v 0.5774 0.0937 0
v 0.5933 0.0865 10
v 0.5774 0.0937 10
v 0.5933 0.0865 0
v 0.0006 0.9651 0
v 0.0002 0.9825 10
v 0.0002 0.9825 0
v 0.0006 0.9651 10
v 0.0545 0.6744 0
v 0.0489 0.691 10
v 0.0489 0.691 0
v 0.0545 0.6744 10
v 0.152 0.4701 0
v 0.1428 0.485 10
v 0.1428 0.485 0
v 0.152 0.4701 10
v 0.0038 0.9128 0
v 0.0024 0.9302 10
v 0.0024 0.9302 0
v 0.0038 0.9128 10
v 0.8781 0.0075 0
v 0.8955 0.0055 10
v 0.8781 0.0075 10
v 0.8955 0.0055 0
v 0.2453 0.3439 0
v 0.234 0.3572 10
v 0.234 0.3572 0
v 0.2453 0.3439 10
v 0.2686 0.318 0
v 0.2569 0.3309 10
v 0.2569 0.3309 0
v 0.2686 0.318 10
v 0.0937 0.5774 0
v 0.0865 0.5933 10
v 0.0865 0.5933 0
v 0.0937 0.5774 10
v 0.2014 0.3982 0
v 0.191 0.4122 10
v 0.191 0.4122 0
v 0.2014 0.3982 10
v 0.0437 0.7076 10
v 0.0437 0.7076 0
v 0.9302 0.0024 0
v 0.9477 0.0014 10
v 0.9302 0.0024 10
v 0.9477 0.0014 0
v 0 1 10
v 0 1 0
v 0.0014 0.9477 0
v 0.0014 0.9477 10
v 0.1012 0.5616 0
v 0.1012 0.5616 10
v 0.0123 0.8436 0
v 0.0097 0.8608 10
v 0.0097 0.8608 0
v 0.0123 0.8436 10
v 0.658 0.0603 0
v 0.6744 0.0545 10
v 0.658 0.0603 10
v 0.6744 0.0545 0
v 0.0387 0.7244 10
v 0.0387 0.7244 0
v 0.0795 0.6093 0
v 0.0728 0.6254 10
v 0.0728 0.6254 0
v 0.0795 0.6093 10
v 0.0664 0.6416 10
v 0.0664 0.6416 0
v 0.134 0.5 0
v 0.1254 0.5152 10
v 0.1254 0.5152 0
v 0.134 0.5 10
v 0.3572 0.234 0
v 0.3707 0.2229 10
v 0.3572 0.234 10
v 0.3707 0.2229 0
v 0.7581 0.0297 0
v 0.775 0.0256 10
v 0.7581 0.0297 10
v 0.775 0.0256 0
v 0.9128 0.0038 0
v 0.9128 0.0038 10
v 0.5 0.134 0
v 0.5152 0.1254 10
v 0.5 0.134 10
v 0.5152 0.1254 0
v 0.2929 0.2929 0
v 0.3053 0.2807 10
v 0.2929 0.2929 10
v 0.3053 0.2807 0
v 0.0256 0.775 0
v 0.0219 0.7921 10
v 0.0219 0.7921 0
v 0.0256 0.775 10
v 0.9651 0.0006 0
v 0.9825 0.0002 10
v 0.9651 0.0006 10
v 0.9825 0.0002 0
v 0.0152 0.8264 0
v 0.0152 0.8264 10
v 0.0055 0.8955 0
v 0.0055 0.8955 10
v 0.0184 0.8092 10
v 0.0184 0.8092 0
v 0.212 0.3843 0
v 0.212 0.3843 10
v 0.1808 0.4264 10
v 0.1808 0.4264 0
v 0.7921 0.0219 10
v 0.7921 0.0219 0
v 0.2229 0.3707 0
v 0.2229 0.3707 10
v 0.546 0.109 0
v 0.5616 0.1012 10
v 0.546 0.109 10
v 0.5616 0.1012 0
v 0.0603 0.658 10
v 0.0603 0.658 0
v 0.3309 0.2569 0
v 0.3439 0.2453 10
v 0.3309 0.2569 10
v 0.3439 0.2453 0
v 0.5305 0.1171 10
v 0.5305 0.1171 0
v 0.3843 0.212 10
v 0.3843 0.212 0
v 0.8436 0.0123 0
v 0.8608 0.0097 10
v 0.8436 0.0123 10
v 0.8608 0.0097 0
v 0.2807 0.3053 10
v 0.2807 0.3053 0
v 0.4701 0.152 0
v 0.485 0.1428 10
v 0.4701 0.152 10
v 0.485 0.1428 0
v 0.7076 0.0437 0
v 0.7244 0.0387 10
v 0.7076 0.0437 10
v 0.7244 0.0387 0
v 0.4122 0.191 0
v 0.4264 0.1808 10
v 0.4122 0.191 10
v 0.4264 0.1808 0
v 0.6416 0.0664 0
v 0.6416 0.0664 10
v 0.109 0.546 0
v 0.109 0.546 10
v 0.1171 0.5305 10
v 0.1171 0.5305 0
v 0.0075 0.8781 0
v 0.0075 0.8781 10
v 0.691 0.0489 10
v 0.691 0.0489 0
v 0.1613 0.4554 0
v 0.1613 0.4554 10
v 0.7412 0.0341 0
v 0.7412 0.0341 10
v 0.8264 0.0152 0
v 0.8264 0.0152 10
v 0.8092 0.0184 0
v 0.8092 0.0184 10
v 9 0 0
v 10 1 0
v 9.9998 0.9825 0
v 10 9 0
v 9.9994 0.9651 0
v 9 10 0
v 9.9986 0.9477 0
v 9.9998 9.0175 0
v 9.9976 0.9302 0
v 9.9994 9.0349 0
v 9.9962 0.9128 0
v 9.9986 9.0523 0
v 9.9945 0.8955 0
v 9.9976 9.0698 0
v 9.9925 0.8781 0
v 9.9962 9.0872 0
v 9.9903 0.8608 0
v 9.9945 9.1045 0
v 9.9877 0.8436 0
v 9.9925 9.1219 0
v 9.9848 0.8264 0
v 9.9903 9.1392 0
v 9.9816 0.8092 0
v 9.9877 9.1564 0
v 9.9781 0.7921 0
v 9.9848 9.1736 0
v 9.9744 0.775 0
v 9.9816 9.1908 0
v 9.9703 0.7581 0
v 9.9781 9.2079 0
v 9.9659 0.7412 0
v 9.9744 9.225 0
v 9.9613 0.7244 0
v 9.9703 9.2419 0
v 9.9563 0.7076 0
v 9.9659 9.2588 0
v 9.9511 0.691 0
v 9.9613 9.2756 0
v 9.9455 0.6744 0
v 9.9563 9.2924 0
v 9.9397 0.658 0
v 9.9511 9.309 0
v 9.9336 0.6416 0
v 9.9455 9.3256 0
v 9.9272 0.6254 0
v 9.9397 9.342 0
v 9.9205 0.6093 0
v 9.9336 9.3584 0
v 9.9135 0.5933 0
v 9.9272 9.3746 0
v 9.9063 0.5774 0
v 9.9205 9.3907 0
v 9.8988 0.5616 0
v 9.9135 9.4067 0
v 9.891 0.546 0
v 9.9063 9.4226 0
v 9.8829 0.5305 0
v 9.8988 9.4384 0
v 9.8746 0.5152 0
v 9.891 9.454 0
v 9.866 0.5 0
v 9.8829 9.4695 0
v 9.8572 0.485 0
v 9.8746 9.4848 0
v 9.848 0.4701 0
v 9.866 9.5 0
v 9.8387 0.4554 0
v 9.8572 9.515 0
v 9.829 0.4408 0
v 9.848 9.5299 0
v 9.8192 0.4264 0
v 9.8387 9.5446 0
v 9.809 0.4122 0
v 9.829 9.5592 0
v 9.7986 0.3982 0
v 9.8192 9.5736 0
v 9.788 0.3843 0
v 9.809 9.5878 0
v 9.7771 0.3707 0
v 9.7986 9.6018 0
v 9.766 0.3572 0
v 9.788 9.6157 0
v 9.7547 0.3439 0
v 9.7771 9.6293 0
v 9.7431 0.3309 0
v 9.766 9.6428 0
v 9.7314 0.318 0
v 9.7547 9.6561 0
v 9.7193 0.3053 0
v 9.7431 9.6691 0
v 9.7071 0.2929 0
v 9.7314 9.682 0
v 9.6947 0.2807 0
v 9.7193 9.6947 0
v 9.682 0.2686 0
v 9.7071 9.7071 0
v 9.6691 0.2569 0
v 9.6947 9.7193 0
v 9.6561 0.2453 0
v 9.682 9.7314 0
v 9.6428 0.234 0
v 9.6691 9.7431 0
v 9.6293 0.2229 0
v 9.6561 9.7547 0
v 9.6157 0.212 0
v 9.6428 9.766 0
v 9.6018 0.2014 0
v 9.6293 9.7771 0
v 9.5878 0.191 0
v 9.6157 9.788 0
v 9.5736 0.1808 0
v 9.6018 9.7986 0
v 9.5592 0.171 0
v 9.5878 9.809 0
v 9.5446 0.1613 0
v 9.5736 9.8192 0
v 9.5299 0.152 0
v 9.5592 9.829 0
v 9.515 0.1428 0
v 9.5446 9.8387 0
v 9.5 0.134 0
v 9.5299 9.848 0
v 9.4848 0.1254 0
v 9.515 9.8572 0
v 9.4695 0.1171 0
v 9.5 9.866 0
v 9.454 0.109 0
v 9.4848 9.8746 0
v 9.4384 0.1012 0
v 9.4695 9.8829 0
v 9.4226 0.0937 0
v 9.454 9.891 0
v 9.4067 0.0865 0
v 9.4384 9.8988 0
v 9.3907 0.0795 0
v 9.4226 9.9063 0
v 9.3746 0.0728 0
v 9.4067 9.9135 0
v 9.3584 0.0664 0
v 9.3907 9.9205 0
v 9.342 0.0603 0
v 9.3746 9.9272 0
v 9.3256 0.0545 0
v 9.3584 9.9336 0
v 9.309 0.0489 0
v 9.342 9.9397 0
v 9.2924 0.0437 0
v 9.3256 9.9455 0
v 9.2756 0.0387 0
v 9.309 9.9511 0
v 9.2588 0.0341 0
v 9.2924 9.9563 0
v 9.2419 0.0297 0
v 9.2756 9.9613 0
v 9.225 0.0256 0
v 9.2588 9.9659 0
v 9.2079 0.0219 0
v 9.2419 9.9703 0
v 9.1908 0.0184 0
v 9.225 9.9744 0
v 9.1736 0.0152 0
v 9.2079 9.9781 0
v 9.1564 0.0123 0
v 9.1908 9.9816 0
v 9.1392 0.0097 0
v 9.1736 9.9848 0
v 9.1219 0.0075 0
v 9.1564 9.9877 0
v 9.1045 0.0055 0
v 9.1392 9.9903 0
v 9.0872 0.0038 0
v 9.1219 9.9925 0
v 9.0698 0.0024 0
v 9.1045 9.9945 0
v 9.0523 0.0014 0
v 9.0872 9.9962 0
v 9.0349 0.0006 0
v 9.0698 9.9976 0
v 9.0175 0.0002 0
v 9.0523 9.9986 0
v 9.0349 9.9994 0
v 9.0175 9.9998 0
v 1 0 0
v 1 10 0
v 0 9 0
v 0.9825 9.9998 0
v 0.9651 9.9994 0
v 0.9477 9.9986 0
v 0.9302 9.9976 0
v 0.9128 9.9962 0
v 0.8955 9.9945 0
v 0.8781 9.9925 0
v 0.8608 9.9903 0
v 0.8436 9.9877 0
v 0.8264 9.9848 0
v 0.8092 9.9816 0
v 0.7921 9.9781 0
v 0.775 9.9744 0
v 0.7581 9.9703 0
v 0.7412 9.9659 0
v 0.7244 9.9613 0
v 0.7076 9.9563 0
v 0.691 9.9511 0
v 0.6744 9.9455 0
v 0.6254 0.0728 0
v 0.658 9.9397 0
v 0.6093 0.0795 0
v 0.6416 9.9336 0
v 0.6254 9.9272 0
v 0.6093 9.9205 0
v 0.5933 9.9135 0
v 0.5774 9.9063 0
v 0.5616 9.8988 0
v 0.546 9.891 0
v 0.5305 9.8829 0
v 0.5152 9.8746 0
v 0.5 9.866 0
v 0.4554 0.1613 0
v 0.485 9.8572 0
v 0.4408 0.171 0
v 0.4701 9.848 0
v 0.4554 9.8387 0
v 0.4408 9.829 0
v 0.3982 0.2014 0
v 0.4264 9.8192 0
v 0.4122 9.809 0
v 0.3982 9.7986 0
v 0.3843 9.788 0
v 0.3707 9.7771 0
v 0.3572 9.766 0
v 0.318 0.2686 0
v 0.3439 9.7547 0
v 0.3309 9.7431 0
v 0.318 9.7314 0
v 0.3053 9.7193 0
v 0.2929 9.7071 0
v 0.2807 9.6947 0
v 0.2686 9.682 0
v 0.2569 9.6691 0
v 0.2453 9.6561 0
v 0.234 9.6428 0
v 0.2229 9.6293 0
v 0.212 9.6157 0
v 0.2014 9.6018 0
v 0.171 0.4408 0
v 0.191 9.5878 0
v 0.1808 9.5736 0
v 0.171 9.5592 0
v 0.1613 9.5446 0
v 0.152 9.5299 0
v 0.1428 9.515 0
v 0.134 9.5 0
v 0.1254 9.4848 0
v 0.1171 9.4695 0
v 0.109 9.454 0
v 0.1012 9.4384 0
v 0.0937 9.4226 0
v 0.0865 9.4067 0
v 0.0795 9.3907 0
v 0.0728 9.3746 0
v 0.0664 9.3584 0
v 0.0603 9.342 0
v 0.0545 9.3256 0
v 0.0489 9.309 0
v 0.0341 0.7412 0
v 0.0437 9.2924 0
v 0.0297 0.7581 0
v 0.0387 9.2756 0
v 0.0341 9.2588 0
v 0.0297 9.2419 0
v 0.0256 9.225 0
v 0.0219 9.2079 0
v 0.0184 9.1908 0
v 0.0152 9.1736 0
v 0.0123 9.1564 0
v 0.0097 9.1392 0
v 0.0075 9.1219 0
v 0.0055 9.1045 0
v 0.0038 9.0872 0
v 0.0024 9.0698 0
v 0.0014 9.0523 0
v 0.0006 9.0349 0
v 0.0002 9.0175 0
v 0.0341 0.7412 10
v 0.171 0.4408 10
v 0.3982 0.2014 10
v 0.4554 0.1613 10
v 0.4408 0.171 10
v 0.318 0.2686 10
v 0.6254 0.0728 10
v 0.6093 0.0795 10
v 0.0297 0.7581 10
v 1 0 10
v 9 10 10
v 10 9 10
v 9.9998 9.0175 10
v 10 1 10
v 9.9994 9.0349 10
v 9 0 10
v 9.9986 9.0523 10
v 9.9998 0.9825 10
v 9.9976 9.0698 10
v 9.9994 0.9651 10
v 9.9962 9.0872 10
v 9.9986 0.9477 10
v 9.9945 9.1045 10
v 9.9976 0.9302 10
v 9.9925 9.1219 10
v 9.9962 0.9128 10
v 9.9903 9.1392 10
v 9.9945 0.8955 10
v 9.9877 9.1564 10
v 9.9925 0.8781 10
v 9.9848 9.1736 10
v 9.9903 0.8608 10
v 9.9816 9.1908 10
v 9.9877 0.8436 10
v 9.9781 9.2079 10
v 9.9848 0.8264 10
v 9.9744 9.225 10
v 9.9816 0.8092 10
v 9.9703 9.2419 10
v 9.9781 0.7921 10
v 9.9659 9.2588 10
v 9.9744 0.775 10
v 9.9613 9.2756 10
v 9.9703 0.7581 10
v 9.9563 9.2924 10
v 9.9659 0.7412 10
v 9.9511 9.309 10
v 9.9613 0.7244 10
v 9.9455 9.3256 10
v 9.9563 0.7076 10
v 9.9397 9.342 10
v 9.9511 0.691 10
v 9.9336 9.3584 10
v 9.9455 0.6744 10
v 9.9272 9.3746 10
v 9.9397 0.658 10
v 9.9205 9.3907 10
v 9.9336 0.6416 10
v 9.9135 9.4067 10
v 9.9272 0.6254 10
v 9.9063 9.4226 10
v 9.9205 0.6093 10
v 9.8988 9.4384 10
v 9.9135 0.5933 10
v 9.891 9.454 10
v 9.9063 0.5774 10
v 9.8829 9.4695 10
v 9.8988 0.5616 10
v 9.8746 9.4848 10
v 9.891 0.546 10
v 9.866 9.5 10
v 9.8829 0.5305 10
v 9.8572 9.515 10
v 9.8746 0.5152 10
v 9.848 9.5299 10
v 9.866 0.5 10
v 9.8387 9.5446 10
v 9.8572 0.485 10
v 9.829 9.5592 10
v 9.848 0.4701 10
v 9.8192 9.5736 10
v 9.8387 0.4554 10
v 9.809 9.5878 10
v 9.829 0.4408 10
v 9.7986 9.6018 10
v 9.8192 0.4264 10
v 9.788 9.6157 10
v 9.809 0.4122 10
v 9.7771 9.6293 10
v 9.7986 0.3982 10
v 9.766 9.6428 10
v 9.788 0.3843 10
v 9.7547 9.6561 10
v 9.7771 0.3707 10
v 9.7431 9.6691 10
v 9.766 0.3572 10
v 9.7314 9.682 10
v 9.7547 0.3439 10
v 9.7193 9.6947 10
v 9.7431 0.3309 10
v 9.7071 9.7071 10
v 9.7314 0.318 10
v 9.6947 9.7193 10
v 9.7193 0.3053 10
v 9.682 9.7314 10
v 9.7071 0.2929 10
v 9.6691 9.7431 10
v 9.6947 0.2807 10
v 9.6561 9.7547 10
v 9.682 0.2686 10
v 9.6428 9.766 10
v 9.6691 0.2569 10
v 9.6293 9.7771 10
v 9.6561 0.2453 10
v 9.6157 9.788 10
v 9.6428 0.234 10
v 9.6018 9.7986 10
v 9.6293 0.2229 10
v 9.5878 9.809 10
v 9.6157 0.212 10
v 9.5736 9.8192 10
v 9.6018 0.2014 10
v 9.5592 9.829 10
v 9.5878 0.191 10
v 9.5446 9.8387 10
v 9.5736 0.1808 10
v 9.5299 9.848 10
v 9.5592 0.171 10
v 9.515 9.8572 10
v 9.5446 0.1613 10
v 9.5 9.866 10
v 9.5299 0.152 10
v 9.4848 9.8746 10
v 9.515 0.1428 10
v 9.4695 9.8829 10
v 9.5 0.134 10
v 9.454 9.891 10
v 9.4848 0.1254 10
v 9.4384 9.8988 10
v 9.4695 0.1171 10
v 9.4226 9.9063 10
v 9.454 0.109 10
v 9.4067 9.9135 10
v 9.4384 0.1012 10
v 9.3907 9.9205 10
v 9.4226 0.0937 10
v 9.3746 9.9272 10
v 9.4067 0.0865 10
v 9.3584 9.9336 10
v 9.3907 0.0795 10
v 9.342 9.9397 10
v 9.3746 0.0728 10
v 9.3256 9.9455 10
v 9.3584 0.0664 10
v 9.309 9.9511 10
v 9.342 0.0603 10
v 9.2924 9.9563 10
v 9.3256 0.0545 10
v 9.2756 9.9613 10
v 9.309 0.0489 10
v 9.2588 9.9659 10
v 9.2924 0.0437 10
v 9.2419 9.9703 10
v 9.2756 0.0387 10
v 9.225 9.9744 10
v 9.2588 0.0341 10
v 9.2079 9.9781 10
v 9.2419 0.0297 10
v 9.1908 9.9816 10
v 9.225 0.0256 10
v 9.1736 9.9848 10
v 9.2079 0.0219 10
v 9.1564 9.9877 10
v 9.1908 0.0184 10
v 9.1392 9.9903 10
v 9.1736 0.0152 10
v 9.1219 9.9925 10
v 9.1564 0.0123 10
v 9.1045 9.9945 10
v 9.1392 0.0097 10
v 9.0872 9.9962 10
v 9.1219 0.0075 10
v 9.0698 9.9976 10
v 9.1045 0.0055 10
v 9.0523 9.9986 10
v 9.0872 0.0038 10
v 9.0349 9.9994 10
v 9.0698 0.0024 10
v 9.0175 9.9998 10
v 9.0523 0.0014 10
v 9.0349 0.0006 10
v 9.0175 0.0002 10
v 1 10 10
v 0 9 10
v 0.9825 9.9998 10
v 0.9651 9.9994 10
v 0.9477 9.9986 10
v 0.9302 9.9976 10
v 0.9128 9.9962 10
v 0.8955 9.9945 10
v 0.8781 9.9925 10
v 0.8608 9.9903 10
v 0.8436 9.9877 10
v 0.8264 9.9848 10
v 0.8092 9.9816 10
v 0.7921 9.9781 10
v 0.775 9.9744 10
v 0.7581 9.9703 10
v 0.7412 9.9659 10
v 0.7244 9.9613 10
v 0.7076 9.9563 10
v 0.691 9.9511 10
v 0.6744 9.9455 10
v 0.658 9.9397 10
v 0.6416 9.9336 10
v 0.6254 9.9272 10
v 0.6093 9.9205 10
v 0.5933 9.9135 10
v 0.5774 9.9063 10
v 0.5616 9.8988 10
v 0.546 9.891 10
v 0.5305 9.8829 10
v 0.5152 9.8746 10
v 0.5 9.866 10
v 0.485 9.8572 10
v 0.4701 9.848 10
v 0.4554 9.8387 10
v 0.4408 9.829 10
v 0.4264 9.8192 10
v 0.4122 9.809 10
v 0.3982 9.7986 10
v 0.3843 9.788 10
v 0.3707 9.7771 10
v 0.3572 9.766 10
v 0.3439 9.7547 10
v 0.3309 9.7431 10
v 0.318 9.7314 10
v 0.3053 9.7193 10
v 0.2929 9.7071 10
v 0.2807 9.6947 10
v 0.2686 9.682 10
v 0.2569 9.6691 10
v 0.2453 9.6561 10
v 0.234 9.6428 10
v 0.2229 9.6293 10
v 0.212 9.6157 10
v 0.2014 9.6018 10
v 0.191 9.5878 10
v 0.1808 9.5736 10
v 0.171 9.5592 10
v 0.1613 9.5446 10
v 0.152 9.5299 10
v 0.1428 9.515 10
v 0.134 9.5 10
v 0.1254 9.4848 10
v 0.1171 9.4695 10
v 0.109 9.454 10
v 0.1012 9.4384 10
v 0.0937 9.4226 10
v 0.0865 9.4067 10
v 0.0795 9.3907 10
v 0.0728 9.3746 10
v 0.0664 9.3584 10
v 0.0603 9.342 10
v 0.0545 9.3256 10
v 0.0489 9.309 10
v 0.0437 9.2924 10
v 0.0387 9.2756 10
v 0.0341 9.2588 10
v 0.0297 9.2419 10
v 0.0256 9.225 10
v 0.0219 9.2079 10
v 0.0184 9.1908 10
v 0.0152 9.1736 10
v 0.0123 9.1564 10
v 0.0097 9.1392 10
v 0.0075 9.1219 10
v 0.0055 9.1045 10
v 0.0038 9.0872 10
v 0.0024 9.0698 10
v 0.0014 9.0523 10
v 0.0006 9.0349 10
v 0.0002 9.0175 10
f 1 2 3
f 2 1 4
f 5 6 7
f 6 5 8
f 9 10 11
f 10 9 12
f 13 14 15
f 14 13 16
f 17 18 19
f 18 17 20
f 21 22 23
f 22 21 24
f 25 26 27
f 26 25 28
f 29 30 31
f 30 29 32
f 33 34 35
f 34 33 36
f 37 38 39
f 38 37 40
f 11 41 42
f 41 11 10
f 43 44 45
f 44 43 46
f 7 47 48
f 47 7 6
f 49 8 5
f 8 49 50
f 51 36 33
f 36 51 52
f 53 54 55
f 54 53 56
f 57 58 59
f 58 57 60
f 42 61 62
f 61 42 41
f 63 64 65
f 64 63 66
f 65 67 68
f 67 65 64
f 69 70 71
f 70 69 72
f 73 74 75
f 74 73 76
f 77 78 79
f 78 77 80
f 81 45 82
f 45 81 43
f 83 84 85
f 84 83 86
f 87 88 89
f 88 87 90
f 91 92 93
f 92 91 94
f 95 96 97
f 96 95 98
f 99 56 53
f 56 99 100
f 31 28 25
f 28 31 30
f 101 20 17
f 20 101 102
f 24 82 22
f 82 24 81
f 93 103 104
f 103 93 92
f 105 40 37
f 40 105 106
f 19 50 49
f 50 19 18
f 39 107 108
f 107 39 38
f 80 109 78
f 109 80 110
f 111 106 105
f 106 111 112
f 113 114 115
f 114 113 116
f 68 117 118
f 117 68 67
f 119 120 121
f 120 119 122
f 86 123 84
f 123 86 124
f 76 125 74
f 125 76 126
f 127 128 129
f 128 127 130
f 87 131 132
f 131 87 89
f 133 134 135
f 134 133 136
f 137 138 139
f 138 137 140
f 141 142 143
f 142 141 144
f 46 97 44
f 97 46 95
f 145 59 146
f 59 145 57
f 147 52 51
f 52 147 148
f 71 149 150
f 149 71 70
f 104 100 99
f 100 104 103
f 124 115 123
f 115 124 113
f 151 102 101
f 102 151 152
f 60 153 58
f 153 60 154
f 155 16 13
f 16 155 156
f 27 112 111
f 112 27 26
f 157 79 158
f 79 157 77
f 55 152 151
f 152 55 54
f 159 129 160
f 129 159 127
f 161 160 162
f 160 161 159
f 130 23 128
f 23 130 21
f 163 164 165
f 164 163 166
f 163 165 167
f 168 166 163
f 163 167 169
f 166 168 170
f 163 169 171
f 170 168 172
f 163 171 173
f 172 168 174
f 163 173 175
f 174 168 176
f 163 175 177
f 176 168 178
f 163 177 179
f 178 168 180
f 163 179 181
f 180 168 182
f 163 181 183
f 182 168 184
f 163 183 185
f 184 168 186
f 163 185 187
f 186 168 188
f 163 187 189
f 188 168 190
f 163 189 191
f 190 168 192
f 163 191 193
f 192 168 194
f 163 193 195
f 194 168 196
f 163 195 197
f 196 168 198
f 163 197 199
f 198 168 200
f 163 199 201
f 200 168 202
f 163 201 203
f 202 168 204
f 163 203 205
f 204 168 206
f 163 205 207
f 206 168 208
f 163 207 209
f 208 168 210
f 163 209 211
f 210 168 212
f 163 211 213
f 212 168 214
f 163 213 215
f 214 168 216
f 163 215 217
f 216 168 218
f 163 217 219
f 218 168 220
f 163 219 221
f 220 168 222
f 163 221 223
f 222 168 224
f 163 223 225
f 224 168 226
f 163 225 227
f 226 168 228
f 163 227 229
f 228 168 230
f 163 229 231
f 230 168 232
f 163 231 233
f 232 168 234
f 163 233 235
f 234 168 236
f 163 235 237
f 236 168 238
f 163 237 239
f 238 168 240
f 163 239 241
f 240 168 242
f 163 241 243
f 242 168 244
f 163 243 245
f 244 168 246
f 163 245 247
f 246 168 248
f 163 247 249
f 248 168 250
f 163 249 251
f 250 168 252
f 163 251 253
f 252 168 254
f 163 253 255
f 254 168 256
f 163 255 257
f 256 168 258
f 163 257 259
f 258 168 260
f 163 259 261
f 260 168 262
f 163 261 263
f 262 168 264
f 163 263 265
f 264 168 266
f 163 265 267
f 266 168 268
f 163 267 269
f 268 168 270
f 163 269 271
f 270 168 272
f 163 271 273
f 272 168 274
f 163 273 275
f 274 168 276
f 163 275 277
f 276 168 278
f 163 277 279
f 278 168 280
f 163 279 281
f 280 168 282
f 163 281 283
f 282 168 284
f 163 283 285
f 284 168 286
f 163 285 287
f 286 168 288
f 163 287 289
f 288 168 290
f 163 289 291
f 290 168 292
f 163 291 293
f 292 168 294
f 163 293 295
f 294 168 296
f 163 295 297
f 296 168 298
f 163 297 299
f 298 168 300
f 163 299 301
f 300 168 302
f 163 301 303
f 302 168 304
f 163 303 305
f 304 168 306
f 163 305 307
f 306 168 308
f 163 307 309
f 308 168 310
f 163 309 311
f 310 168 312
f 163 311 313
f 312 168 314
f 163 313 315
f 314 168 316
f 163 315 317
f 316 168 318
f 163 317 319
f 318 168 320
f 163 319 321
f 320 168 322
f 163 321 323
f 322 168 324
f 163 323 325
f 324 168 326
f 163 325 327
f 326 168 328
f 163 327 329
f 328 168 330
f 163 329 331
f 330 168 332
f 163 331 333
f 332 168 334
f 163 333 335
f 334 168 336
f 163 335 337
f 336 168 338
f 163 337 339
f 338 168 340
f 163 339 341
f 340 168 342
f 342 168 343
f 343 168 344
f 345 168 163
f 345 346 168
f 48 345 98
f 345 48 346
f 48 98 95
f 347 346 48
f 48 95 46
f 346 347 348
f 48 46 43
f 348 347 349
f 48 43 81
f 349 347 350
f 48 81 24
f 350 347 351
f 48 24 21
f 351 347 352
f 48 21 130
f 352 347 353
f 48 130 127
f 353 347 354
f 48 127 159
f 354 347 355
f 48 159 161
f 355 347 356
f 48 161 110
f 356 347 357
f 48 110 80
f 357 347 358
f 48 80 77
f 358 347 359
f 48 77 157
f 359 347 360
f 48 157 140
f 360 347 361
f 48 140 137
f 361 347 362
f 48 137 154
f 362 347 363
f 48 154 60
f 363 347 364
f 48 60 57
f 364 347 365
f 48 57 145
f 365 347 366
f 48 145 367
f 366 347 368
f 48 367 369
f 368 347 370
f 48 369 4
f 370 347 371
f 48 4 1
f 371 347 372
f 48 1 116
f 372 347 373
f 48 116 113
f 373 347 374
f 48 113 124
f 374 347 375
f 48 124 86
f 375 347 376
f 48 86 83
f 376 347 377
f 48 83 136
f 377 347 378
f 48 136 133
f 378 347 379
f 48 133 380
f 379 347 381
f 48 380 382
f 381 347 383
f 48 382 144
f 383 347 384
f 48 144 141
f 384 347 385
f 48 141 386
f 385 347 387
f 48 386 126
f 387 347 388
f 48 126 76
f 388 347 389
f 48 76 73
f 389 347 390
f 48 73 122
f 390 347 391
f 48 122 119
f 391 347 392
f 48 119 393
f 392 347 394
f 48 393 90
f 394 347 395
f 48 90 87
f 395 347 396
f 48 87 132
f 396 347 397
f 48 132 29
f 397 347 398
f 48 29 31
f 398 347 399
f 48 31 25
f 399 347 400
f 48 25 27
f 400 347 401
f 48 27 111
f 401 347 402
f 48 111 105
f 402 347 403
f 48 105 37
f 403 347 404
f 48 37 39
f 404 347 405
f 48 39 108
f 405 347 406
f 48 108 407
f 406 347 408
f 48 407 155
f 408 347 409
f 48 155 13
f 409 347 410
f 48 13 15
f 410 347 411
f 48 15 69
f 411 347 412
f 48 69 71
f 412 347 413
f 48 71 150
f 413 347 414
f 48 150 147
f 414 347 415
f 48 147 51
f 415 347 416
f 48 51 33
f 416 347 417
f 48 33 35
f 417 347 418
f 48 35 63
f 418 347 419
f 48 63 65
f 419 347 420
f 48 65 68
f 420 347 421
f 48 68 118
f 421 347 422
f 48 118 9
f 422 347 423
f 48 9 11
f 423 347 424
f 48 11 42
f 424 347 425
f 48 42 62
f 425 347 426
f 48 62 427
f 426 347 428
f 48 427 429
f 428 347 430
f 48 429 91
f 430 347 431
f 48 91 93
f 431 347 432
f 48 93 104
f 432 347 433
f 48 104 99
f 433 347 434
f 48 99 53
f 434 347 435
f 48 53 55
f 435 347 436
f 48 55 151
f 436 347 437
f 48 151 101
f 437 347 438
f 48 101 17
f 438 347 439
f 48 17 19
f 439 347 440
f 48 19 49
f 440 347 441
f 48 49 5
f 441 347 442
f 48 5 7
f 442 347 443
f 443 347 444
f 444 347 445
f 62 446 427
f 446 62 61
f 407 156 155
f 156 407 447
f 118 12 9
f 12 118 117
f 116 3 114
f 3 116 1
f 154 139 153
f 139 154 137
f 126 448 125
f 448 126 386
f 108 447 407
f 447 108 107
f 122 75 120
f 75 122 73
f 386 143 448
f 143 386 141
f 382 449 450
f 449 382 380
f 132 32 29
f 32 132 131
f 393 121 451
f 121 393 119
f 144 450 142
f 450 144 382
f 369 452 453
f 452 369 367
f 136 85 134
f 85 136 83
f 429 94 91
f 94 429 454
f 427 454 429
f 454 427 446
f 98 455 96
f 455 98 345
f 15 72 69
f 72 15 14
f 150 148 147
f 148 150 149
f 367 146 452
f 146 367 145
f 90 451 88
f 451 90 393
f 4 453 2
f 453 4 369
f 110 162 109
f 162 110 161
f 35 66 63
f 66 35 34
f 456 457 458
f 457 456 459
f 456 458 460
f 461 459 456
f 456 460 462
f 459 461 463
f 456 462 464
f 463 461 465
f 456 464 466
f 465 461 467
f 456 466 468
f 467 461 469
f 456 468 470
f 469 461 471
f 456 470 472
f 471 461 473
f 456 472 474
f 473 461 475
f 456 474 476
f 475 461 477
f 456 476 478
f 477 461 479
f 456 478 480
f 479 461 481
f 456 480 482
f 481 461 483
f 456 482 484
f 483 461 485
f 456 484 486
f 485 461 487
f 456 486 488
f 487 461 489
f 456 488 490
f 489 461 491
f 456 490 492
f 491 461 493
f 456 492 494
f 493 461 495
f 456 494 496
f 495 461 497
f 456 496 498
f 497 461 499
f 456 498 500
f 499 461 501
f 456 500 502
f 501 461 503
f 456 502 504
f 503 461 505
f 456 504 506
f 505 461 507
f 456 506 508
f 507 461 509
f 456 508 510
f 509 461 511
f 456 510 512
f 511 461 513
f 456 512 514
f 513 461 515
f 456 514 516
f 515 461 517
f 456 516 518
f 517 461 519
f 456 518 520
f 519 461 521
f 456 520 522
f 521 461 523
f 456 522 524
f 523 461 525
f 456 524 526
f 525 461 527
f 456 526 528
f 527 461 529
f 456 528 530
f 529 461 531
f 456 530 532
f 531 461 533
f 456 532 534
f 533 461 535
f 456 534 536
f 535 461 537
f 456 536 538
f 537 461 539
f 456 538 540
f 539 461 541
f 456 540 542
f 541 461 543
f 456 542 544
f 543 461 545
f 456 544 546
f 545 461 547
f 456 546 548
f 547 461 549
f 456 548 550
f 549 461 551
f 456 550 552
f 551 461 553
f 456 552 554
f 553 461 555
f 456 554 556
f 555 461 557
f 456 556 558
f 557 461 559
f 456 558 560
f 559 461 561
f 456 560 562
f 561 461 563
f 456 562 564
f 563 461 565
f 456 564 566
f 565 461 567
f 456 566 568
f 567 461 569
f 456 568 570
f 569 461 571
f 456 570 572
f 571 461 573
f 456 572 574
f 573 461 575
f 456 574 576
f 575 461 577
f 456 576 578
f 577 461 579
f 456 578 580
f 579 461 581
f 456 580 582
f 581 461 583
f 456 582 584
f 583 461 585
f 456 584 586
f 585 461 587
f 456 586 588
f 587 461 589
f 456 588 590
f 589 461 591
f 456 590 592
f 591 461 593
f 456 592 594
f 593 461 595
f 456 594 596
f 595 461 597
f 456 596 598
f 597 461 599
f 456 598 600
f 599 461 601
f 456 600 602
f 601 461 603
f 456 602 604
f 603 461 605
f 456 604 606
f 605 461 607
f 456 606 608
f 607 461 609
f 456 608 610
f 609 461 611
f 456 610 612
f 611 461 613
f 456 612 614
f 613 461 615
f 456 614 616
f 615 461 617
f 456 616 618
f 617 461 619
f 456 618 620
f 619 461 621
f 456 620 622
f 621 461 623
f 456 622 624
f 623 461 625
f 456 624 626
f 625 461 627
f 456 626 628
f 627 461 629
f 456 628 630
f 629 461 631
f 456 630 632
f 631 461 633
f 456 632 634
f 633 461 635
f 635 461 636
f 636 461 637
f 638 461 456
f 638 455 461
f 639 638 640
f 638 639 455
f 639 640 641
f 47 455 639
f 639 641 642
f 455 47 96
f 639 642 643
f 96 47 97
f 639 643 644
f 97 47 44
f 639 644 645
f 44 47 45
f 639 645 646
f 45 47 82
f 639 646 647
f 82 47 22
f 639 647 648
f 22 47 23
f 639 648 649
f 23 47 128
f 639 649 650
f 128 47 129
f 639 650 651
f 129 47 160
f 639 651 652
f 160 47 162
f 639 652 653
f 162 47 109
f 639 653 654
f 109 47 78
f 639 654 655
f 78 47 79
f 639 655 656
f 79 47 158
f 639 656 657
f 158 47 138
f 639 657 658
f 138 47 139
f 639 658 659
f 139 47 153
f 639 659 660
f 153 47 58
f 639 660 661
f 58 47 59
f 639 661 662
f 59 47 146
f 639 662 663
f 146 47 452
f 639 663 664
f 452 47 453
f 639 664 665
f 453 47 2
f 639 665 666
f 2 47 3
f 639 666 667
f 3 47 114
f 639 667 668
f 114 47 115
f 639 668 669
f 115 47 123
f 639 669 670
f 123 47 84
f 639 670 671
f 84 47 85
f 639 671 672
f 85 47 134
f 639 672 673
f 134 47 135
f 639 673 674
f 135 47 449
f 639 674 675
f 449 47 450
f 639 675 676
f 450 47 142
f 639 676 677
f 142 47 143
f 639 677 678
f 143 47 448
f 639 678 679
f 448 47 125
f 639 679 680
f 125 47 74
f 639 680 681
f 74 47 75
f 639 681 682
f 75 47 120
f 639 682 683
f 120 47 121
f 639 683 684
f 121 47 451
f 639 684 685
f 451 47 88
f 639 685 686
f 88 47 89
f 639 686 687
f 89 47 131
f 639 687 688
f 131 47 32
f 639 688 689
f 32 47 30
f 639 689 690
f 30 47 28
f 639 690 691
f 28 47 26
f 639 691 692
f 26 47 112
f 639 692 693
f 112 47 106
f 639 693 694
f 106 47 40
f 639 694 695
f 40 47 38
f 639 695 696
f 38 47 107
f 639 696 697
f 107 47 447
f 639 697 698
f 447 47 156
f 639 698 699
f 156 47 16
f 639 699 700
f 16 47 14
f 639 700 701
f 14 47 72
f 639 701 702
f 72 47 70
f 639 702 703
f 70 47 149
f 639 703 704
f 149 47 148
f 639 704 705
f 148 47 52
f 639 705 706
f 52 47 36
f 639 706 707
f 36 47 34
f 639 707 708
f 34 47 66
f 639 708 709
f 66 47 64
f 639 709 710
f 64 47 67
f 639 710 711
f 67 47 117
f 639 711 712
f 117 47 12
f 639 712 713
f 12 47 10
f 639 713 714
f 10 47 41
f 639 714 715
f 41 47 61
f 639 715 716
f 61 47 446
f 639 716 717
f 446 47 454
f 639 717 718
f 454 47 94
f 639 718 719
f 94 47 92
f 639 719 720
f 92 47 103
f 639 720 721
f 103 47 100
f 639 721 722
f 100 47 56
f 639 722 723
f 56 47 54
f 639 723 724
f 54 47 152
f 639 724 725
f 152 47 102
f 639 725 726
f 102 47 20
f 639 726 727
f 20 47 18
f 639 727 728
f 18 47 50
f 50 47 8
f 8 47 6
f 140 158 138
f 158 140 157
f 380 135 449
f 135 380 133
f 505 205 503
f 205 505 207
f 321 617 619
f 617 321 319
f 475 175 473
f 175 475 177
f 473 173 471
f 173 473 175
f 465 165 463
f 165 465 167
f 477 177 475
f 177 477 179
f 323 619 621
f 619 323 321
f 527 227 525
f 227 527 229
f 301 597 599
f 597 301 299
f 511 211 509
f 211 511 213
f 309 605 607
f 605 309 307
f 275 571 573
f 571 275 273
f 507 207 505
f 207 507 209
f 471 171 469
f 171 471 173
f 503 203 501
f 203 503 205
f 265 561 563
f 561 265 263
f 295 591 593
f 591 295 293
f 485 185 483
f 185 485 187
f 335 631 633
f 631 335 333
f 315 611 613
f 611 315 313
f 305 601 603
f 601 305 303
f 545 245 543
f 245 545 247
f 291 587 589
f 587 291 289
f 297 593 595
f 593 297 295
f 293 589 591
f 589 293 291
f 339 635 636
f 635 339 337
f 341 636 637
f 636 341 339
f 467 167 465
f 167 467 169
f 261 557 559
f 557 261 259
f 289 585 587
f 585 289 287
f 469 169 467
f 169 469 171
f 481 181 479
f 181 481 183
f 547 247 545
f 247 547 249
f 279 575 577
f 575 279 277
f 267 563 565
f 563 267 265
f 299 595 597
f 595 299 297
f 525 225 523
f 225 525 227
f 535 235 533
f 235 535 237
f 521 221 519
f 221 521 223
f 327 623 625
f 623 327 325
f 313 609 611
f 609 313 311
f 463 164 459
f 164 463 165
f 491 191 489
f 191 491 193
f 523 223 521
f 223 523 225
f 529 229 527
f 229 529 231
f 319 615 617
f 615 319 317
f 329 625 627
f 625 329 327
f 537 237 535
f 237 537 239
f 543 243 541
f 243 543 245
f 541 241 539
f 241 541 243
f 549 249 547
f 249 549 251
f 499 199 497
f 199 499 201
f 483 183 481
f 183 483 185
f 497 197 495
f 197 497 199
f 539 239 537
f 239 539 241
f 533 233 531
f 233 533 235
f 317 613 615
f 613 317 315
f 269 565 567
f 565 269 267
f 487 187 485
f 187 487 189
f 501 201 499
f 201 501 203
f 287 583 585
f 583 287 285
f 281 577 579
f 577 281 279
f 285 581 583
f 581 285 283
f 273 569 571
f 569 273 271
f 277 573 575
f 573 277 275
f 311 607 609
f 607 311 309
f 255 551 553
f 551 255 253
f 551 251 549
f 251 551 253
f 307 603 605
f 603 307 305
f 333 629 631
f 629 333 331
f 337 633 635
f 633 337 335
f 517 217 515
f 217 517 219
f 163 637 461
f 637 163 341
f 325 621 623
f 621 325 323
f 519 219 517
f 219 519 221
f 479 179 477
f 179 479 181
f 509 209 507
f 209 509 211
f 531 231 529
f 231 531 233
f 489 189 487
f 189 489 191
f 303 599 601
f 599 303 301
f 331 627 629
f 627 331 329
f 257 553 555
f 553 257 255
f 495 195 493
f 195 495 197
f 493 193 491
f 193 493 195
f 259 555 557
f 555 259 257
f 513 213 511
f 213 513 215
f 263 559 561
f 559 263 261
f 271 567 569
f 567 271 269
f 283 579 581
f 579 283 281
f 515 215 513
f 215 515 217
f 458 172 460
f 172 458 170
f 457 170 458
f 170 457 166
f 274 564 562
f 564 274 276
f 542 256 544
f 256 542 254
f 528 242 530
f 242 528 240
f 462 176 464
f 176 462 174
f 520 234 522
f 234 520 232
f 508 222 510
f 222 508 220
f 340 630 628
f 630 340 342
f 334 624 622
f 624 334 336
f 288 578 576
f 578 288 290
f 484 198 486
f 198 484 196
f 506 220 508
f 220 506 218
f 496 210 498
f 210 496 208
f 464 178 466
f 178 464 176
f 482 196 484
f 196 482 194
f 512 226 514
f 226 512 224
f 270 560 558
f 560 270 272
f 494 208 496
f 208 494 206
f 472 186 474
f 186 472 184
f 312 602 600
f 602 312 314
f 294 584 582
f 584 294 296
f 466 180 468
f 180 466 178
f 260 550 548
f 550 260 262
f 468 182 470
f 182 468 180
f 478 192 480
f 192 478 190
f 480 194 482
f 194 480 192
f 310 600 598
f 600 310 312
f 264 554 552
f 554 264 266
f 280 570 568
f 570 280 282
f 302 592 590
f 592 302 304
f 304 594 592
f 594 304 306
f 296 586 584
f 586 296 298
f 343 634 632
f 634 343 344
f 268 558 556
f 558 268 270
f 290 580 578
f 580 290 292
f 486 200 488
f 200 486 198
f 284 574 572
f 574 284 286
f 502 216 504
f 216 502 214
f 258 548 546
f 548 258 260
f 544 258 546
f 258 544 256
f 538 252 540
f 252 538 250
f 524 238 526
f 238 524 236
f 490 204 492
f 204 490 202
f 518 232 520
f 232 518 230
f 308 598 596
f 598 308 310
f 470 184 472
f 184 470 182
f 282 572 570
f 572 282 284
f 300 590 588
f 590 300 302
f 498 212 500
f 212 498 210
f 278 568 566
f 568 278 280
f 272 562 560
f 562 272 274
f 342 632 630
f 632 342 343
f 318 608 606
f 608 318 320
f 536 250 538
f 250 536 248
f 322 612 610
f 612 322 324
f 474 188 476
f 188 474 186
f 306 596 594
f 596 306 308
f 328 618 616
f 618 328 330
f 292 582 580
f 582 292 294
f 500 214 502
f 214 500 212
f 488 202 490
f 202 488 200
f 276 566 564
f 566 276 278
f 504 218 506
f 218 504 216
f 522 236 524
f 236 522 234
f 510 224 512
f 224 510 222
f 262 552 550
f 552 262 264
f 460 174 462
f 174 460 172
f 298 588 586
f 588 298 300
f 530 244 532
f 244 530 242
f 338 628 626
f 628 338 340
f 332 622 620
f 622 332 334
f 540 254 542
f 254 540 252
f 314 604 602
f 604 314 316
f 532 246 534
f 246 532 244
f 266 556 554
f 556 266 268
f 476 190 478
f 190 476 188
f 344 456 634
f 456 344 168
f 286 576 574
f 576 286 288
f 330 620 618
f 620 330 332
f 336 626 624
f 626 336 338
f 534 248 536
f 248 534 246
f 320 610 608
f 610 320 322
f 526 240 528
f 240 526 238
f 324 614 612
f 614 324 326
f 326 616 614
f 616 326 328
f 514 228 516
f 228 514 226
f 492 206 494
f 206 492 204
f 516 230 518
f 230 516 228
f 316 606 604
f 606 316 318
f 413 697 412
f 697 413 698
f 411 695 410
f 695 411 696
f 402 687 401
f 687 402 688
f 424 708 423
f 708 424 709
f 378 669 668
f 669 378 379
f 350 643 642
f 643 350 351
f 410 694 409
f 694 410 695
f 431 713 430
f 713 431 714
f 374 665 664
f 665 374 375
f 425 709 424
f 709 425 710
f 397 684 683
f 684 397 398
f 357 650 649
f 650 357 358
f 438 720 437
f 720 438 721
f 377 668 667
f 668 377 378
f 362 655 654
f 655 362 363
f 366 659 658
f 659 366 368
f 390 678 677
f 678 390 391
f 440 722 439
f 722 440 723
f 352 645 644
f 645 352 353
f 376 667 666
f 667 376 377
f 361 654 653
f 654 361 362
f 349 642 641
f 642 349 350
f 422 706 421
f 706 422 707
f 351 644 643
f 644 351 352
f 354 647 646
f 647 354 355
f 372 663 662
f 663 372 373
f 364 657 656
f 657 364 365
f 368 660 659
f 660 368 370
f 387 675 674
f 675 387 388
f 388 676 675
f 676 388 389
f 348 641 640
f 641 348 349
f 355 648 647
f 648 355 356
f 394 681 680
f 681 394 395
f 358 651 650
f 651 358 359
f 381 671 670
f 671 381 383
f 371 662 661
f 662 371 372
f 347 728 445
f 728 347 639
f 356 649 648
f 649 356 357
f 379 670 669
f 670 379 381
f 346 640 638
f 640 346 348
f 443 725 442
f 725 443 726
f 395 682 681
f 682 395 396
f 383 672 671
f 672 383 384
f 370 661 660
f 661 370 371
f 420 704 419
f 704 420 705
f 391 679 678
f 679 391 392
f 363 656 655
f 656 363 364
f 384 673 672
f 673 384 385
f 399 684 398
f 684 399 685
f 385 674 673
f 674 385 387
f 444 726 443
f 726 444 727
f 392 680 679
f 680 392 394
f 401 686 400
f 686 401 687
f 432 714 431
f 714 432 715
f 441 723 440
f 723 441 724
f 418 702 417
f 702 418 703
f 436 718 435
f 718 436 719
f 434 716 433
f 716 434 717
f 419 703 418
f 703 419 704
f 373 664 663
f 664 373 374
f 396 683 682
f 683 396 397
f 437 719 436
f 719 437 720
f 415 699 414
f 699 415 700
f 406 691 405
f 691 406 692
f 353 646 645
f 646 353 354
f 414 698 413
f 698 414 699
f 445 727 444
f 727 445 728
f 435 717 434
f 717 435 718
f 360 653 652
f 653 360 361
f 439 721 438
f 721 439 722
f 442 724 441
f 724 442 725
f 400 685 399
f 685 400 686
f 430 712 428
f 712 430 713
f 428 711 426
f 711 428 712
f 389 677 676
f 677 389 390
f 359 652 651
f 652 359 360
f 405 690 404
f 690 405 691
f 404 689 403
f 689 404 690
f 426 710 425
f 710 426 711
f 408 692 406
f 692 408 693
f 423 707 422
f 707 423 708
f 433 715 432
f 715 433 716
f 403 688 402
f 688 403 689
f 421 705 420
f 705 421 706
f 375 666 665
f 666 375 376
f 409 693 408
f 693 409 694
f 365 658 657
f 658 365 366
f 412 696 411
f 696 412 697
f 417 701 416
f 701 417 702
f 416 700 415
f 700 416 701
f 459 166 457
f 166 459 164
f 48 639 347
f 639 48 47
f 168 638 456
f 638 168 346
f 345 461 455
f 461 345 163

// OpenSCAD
/*   	MY Libraries v1.0 - Common Components
		Unless stated otherwise, all modules
		are by Randy Young <dadick83@hotmail.com>
		2010, 2011.   License, GPL v2 or later
**************************************************/

displayMode= 1;  // 0=printer, 1=screen (resolution)

function resolution(value) =
	displayMode==1 ? 360 : value*2*3.141592; // ~1mm resolution for printer
$fn=resolution(4); // default for cylinder & sphere


ep=0.01; //small number to avoid overlaps (non-manifold models)
in=25.4; //inches to millimeter conversion


/***** ROTATION & TRANSLATION SHORTCUTS  *****
Used for common, easy to type single axis moves 
with names I can actually remember (since I never
get the rotation directions right on first try. :o)   */

function tighten (angle=90) =
		[0,0,-1*angle];

function loosen (angle=90) =
		[0,0,angle];

function righty (angle=90) =
		[0,angle,0];

function lefty (angle=90) =
		[0,-1*angle,0];

function backward (angle=90) =
		[-1*angle,0,0];

function forward (angle=90) =
		[angle,0,0];

function push(distance=1) =
		[0,distance,0]; 

function lift(distance=1) =
		[0,0,distance];

function slide(distance=1) =
		[distance,0,0]; 

/*************************************************
BASIC ENGINEERING SHAPES */

module hex (width=10, height=10, flats= true, center=false){
	radius= (flats == true ? width/sin(60)/2 : width/2 );
		cylinder (r=radius, h=height, center=center, $fn=6);
}

module equilateralTriangle (side=10, height=10, center=false){
	translate(center==true ? [-side/2,-sqrt(3)*side/6,-height/2] : [0,0,0])	
		linear_extrude(height=height)
			polygon(points=[[0,0],[side,0],[side/2,sqrt(3)*side/2]]);
}

module pyramid(side=10, height=-1, square=false, centerHorizontal=true, centerVertical=false){
// creates a 3 or 4 sided pyramid.  -1 height= tetrahedron or Johnson's Solid square pyramid
	mHeight= height!=-1 ? height:
		square == true ? (1/sqrt(2))*side:		//square
			sqrt(6)/3*side;						//tetra
	vert= centerVertical!=true ? [0,0,0]:
		square==false ? [0,0,-mHeight/4] :	 //inscribes a tetra inside a sphere, not 1/2 ht
			[0,0,-mHeight/2];	//for squares, center=false inscribes, so true is just 1/2 ht
	horiz= centerHorizontal!= true ? [0,0,0] :
		square == true ? [-side/2, -side/2, 0] : 	//square
			[-side/2,-sqrt(3)*side/6 ,0];			//tetra
	translate(vert+horiz){
		if (square == true){
			polyhedron (	points = [[0,0,0],[0,side,0],[side,side,0],
								[side,0,0],[side/2,side/2,mHeight]], 
						triangles = [[1,0,2], [2,0,3], [0,4,3], 
								[3,4,2], [2,4,1], [1,4,0]]);
		}
		if (square != true){
			polyhedron (	points = [[0,0,0],[side,0,0],[side/2,sqrt(3)*side/2,0],
								[side/2,sqrt(3)*side/6,mHeight]], 
						triangles = [[0,1,2], [1,0,3], [2,1,3],[2,3,0]]);			
		}
}	}

module tube(r=2, thickness=1, height=1, center=false, outline=false){
	translate(lift(center == true ?  0 : 0.5*height)) 
	difference(){
		cylinder(r=r, h=height, center=true, $fn=resolution(r));
		if (outline!=true)
			cylinder(r=r-thickness+ep, h=height+2*ep, center=true, $fn=resolution(r-thickness));
}	}

module roundRect (size=[10,10,10], round=3, center=false){
	$fn=resolution(round);
	radius = min(round, size[0]/2, size[1]/2);
	union(){
		translate(center==true ? [-size[0]/2,-size[1]/2,-size[2]/2] : [0,0,0]){
			translate([radius,radius,0])
				cylinder (r=radius, h=size[2]);
			translate([size[0]-radius,radius,0])
				cylinder (r=radius, h=size[2]);
			translate([size[0]-radius,size[1]-radius,0])
				cylinder (r=radius, h=size[2]);
			translate([radius,size[1]-radius,0])
				cylinder (r=radius, h=size[2]);
			translate([0,radius,0]) 
				cube(size-[0,radius*2,0]);
			translate([radius,0,0]) 
				cube(size-[radius*2,0,0]);
}	}	}

module keyhole(r1, r2, length, height) {
	translate ([0,length/2,0]) union(){
		translate ([0,length/2-r1,0]) 
			cylinder (r=r1, height, $fn=resolution(r1));
		translate ([0,0-(length/2-r2),0]) 
			cylinder (r=r2, height, $fn=resolution(r2));
		translate ([-r1,r1-length/2,0]) 
			cube ([r1*2,length-(r1*2),height]);
	}
}

module slot(size=[4,10,1], startRound=true, endRound=true, centerXYZ=[1,0,0]){
	$fn=resolution(size[0]/2);
	radius=size[0]/2;
	start= startRound==true ? radius : 0;
	end= endRound==true ? radius : 0;
	translate([-size[0]/2*centerXYZ[0],
			-size[1]/2*centerXYZ[1],
			-size[2]/2*centerXYZ[2]]) 
	union(){
		translate([0,start,0]) cube (size-[0,start+end,0]);
		if (startRound==true) translate ([radius,radius,0])
			cylinder (r=size[0]/2, h=size[2]);
		if (endRound==true) translate ([radius,size[1]-radius,0])
			cylinder (r=size[0]/2, h=size[2]);
	
}	}

module dovetail (width=9, height=10, male=true){
	w= (male==true) ? width*0.975 : width;
	translate(slide(2.4)) union(){
		rotate(tighten(30))
			equilateralTriangle(w,height, center=true);
		translate(slide(-4.5)) cube([4.2,width*1.5,height], center=true);}
}

module teardrop(radius=5, length=10, angle=90) {
// teardrop module by whosawhatsis <www.thingiverse.com/thing:3457>
// Creative Commons LGPL, 2010.  I added default values and resolution code
	$fn=resolution(radius);
	rotate([0, angle, 0]) union() {
		linear_extrude(height = length, center = true, convexity = radius, twist = 0)
			circle(r = radius, center = true);
		linear_extrude(height = length, center = true, convexity = radius, twist = 0)
			projection(cut = false) rotate([0, -angle, 0]) 
			translate([0, 0, radius * sin(45) * 1.5]) 
			cylinder(h = radius * sin(45), r1 = radius * sin(45), r2 = 0, 
					center = true);
	}
}


/*************************************************
HARDWARE COMPONENTS */

module hexNut(size="M3", center=false, outline=false, pos=[0,0,0]){
	if (tableRow(size) == -1)	echo(str("hexNut ERROR: size of '",size,"' is undefined."));
	width = tableEntry (size, "nutWidth");
	height = tableEntry (size, "nutThickness");
	hole = tableEntry (size, "nutID");
	translate(pos+lift(center == true ?  0 : 0.5*height)) difference(){
		hex(width, height, center=true);
		if (outline!=true)
			cylinder(r=hole/2+0.01, h=height+0.02, center=true, $fn=resolution(hole/2));
}	}

module washer(size="M3", center=false, outline=false, pos=[0,0,0]){
	if (tableRow(size) == -1)	echo(str("washer ERROR: size of '",size,"' is undefined."));
	width = tableEntry (size, "washerOD");
	height = tableEntry (size, "washerThickness");
	hole = tableEntry (size, "washerID");
	translate(pos) tube(width/2,(width-hole)/2,height,center,outline);
}

module capBolt (size="M3", length= 16, center=false, pos=[0,0,0])	{
	if (tableRow(size) == -1)	echo(str("capBolt ERROR: size of '",size,"' is undefined."));
	diameter = tableEntry (size, "headDiameter");
	head = tableEntry (size, "headThickness");
	stud = tableEntry (size, "studDiameter");	
	translate(pos+[0,0,center == true ? -length/2 : 0]) union()	{
		translate(lift(-head))
			cylinder(r=diameter/2, h=head, $fn=resolution(diameter/2));
		translate(lift(-0.01))
			cylinder(r=stud/2, h=length+0.01, $fn=resolution(stud/2));
}	}

module hexBolt (size="M3", length= 16, center=false, pos=[0,0,0])	{
	if (tableRow(size) == -1)	echo(str("hexBolt ERROR: size of '",size,"' is undefined."));
	width = tableEntry (size, "headDiameter");
	head = tableEntry (size, "headThickness");
	stud = tableEntry (size, "studDiameter");	
	translate(pos+[0,0,center == true ? -length/2 : 0]) union()	{
		translate(lift(-head))
			hex(width, head, $fn=6);
		translate(lift(-ep))
			cylinder(r=stud/2, h=length+0.01, $fn=resolution(stud/2));
}	}

module bearing (size="Skate", center=false, outline=false, pos=[0,0,0]){
// The Elmom MCAD has a much better version of a bearing module.  
// This is a basic donut shape but gets the job done for construction.
	if (tableRow(size) == -1)	echo(str("bearing ERROR: type of '",type,"' is undefined."));
	hole = tableEntry (size, "bearingID");
	thickness = tableEntry (size, "bearingThickness");
	diameter = tableEntry (size, "bearingOD");
	translate(pos) 
		tube(diameter,hole,thickness,center,outline,chosenResolution);
}

/*************************************************
/****  TABLE DATA AND SUPPORT FUNCTIONS		****
The following functions contain various engineering tables but you can add whatever data
you'd like.  I've also used it for translation landmarks.  The table itself is arranged with an array of arrays (vectors) and stored within the "tableRow" function with each row having a string identifier.  Thus, you can retrieve a vector by name without storing a bunch of variables.
	A second array function, called "columnNames" is simply a convenient way to refer to each element within a vector by an element name.  The values overlap, depending on what data type you're working with.  For instance, "bearingWidth" = "headThickness" = z-vector element = 2.
	You can find a specific variable within the data, using "rowElement" that uses row, column strings to identify the element desired.  Uncomment the example below to see it in action. 
						*****/
//testTable();
		module testTable(){
			column = "nutWidth";
			row =	"M3";
			
			echo (str(column," is found in column #",
				columnName(column)	));
			echo (str("The row named ",row," contains: ",
				tableRow(row)		));
			echo (str("The ",column," field of the ",row," row is: ",
				tableEntry(row,column)	));	
		}

function columnName(name)=
	// Bearings
		name == "bearingID" 		? 0 :
		name == "bearingOD" 		? 1 :
		name == "bearingThickness"?2 :
	// Bolts
		name == "studDiameter" 	? 0 :
		name == "headDiameter" 	? 1 :
		name == "headThickness" 	? 2 :
	// Nuts
		name == "nutID"	 		? 0 :
		name == "nutWidth" 		? 3 :
		name == "nutThickness" 	? 4 :
	// Washers
		name == "washerID"	 	? 0 :
		name == "washerOD"	 	? 5 :
		name == "washerThickness"? 6 :
	-1; // Not Found.  Results in Undef fields.

function tableRow (name)=
	// Bearing Names
		name == "606" 		? [6, 13, 6] :
		name == "608" 		? [8, 22, 7] :
		name == "624" 		? [4, 13, 5] :
		name == "Skate" 		? [8, 22, 7] :
	// Bolt, Nut, Washer Sizes
	// It seems hardware size standards are loose, so these dimensions may not match your hardware.
		name == "M2" 		? [2, 4, 2, 4, 1.6, 5.5, 0.3] :		
		name == "M2.5" 		? [2.5, 5, 2.5, 5, 2, 7, 0.5] :		
		name == "M3" 		? [3, 5.5, 3, 5.5, 2.4, 7, 0.5] :		
		name == "M4" 		? [4, 7.0, 4, 7, 3.2, 9, 0.8] :
		name == "M5" 		? [5, 8.5, 5, 8, 4.7, 10, 1] :
		name == "M6" 		? [6, 10, 6, 10, 5.2, 12.5, 1.6 ] :
		name == "M8" 		? [8, 13, 8, 13, 6.8, 17, 1.8] :
		name == "#8"		 	? [0.164*in, 7.1, 0.164*in, 11/32*in, 3.05, in/2, in*0.04] :
		name == "1/4 Hex" 	? [in/4, in*0.505, in*11/64, in*7/16, in*5/32, in*0.734, in*0.063] :
		name == "5/16 Hex"	? [in*5/16, in*0.577, in*7/32, in/2, in*3/16, in*0.875, in*0.063] :
	-1; //Not found in Table

function tableEntry (rowName, fieldName) =
	tableRow(rowName)[columnName(fieldName)];	


/*************************************************
OPENSCAD INTERFACE & EXAMPLES */

libEcho=true;
if (libEcho!=false){ 
	echo ("****************************************************************  ");
	echo ("  'Libs' library loaded. For a list of modules, use libHelp();            ");
	echo ("   For help with translation/rotation functions, use libMoveHelp();");
	echo ("   For examples of each object, use libDemo();                             ");
	echo ("   To turn off this header, place libEcho=false; in your script        ");
	echo ("   libs.scad is @ http://www.thingiverse.com/thing:6021             ");
	echo ("****************** By randyy, 2011, LGPL v2+ ******************  ");
}

module libDemo(){
	translate(slide(15)) pyramid();
	translate(lift(5)) equilateralTriangle(center=true);
	translate(slide(-15)) pyramid(square=true);
	translate(slide(15)+push(15)) tube(5,2, height=10);
	translate([-5,10,0]) roundRect();
	translate([-15,15,0]) hex();
	translate([15,-25,0]) slot([4,15,4],true,false);
	translate([0,-25,0]) keyhole(2,4,15,4);
	translate([-30,-10,0]) hexNut();
	translate([-30,-20,0]) washer();
	translate([-30,0,tableEntry("#8","headThickness")]) capBolt("M3",12);
	translate([-30,15,tableEntry("#8","headThickness")]) hexBolt("#8",12);
	translate([-15,-18,0]) rotate(tighten()) dovetail(9,4);
}

module libHelp(){
	echo();
	echo("  ***********************   libHelp   **************************");
	echo("  displayMode= 1;  // 0=printer, 1=screen (resolution)  ");
	echo("  hex (width=10, height=10, flats= true, center=false)  ");
	echo("  equilateralTriangle (side=10, height=10, center=false)  ");
	echo("  pyramid(side=10, height=-1, square=false, centerHorizontal=true, centerVertical=false)  ");
	echo("  tube(r=2, thickness=1, height=1, center=false, outline=false)  ");
	echo("  roundRect (size=[10,10,10], round=3, center=false)  ");
	echo("  keyhole(r1, r2, length, height)  ");
	echo("  slot(size=[4,10,1], startRound=true, endRound=true, centerXYZ=[1,0,0])  ");
	echo("  dovetail (width=9, height=10, male=true)  ");
	echo("  teardrop(radius=5, length=10, angle=90)  ");
	echo("  hexNut(size='M3', center=false, outline=false, pos=[0,0,0])  ");
	echo("  washer(size='M3', center=false, outline=false, pos=[0,0,0])  ");
	echo("  capBolt (size='M3', length= 16, center=false, pos=[0,0,0])  ");
	echo("  hexBolt (size='M3', length= 16, center=false, pos=[0,0,0])  ");
	echo("  bearing (size='Skate', center=false, outline=false, pos=[0,0,0])  ");
	echo("  TABLE FUNCTIONS  ");
	echo("  function columnName(name)  ");
	echo("  function tableRow (name)  ");
	echo("  function tableEntry (rowName, fieldName)  ");
	echo();
}

module libMoveHelp(){
	echo();
	echo("  *********************   libMoveHelp   ************************");
	echo("  ROTATION - default is 90 degrees, but you can use any value in ().  ");
	echo("     tighten(), clockwise, along z                                                       ");
	echo("     loosen(), counterclockwise, along z                                            ");
	echo("     righty(), leans right, along y axis                                                ");
	echo("     lefty(), leans left, along y axis                                                     ");
	echo("     backward() falls away, along x axis                                             ");
	echo("     forward() falls toward you, along x axis                                      ");
	echo("  TRANSLATION - negative numbers move in opposite direction      ");
	echo("     push(distance) moves object away, along y                                 ");
	echo("     lift(distance) moves object up, along z                                        ");
	echo("     slide(distance) moves object right, along x                                 ");
	echo();
}

//libDemo();
roundRect(round=1);
